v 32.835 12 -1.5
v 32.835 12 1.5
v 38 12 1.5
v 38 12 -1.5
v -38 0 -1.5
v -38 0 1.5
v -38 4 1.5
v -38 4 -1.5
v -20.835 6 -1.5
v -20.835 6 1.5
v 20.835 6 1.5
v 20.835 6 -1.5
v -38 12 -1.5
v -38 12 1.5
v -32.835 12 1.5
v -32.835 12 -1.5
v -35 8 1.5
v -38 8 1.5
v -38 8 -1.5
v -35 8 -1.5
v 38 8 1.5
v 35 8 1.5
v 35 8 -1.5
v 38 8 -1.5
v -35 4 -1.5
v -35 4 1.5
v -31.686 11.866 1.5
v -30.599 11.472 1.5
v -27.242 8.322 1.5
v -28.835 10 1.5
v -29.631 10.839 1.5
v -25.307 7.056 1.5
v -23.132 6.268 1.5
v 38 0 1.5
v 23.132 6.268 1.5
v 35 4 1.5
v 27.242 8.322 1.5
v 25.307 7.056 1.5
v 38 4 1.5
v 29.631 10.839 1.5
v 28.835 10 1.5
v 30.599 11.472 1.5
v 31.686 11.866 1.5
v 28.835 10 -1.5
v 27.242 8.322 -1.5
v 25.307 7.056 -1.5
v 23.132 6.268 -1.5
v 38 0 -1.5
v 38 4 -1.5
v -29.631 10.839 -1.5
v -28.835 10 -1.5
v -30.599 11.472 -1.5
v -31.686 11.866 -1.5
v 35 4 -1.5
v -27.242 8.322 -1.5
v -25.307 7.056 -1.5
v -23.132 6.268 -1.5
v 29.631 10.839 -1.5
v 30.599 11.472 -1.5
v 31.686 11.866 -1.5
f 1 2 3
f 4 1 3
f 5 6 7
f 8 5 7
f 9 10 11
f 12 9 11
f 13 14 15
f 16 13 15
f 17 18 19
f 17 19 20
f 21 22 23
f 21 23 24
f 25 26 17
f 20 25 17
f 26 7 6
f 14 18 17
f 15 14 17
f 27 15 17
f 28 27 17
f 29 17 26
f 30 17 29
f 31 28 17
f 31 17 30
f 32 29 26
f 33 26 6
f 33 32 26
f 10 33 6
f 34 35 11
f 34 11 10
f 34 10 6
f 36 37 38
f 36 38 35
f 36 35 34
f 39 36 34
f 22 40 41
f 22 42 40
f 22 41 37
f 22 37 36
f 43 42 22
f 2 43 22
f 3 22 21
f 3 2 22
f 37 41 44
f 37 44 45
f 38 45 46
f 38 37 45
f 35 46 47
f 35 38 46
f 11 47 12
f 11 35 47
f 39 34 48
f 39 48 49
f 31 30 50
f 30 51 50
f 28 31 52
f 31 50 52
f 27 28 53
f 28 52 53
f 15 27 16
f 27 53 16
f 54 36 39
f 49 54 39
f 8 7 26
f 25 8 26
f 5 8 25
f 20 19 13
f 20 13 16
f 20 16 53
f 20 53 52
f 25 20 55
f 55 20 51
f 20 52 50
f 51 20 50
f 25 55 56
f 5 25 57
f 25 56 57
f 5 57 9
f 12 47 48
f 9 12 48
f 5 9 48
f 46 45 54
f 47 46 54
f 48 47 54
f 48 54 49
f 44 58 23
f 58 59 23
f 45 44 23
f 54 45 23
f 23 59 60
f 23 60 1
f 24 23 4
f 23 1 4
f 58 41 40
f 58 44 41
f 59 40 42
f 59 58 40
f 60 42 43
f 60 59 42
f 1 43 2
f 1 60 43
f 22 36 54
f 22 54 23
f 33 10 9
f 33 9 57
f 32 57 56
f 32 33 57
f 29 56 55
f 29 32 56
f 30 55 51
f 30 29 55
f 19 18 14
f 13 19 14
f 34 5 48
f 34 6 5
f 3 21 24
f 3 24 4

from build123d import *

# Parameters (mm, degrees)
SKETCH1_W           = 70
SKETCH1_H           = 12
BOSS_EXTRUDE1_DEPTH = 1.5
SKETCH2_W           = 60
SKETCH2_H           = 6
CUT_EXTRUDE1_DEPTH  = 38.121422387
FILLET1_R           = 10
FILLET2_R           = 5
SKETCH3_W           = 3
SKETCH3_H           = 4
BOSS_EXTRUDE2_DEPTH = 3


with BuildPart() as part:
    # Sketch1 → Boss-Extrude1 (new, symmetric)
    with BuildSketch(Plane.XY):
        with Locations((0, 6)):
            Rectangle(SKETCH1_W, SKETCH1_H)
    extrude(amount=BOSS_EXTRUDE1_DEPTH, both=True)

    # Sketch2 → Cut-Extrude1 (cut, through all)
    with BuildSketch(Plane.XY.offset(1.5)):
        with Locations((0, 9)):
            Rectangle(SKETCH2_W, SKETCH2_H)
    extrude(amount=-CUT_EXTRUDE1_DEPTH, mode=Mode.SUBTRACT)

    # Fillet1
    # the kernel refuses this fillet: 10 mm, written as the material it adds along each edge
    with BuildSketch(Plane(origin=(30, 6, 1.5), x_dir=(-1, 0, 0), z_dir=(0, 0, -1))) as fillet1_piece_1:
        with BuildLine():
            CenterArc((9.16515139, 10), FILLET1_R, 203.578178478, 66.421821522)
            Line((0, 6), (-0.183303028, 5.92))
            ThreePointArc((-0.183303028, 5.92), (-0.2, 3), (-0.2, 0))
            Line((-0.2, 0), (0, -0.2))
            Line((0, -0.2), (9.16515139, -0.2))
            Line((9.16515139, -0.2), (9.16515139, 0))
        make_face()
    extrude(amount=3)
    with BuildSketch(Plane(origin=(-30, 6, 1.5), x_dir=(0, 1, 0), z_dir=(0, 0, -1))) as fillet1_piece_2:
        with BuildLine():
            CenterArc((10, 9.16515139), FILLET1_R, 180, 66.421821522)
            Line((0, 9.16515139), (-0.2, 9.16515139))
            Line((-0.2, 9.16515139), (-0.2, 0))
            Line((-0.2, 0), (0, -0.2))
            ThreePointArc((0, -0.2), (3, -0.2), (5.92, -0.183303028))
            Line((5.92, -0.183303028), (6, 0))
        make_face()
    extrude(amount=3)

    # Fillet2
    fillet2_edges = [part.edges().sort_by_distance(p)[0] for p in [
        (-30, 12, 0),
        (30, 12, 0),
    ]]
    fillet(fillet2_edges, radius=FILLET2_R)

    # Sketch3 → Boss-Extrude2 (add)
    with BuildSketch(Plane.XY.offset(1.5)):
        with Locations((36.5, 10)):
            Rectangle(SKETCH3_W, SKETCH3_H)
        with Locations((36.5, 2)):
            Rectangle(SKETCH3_W, SKETCH3_H)
        with Locations((-36.5, 2)):
            Rectangle(SKETCH3_W, SKETCH3_H)
        with Locations((-36.5, 10)):
            Rectangle(SKETCH3_W, SKETCH3_H)
    extrude(amount=-BOSS_EXTRUDE2_DEPTH)


solid = part.part
